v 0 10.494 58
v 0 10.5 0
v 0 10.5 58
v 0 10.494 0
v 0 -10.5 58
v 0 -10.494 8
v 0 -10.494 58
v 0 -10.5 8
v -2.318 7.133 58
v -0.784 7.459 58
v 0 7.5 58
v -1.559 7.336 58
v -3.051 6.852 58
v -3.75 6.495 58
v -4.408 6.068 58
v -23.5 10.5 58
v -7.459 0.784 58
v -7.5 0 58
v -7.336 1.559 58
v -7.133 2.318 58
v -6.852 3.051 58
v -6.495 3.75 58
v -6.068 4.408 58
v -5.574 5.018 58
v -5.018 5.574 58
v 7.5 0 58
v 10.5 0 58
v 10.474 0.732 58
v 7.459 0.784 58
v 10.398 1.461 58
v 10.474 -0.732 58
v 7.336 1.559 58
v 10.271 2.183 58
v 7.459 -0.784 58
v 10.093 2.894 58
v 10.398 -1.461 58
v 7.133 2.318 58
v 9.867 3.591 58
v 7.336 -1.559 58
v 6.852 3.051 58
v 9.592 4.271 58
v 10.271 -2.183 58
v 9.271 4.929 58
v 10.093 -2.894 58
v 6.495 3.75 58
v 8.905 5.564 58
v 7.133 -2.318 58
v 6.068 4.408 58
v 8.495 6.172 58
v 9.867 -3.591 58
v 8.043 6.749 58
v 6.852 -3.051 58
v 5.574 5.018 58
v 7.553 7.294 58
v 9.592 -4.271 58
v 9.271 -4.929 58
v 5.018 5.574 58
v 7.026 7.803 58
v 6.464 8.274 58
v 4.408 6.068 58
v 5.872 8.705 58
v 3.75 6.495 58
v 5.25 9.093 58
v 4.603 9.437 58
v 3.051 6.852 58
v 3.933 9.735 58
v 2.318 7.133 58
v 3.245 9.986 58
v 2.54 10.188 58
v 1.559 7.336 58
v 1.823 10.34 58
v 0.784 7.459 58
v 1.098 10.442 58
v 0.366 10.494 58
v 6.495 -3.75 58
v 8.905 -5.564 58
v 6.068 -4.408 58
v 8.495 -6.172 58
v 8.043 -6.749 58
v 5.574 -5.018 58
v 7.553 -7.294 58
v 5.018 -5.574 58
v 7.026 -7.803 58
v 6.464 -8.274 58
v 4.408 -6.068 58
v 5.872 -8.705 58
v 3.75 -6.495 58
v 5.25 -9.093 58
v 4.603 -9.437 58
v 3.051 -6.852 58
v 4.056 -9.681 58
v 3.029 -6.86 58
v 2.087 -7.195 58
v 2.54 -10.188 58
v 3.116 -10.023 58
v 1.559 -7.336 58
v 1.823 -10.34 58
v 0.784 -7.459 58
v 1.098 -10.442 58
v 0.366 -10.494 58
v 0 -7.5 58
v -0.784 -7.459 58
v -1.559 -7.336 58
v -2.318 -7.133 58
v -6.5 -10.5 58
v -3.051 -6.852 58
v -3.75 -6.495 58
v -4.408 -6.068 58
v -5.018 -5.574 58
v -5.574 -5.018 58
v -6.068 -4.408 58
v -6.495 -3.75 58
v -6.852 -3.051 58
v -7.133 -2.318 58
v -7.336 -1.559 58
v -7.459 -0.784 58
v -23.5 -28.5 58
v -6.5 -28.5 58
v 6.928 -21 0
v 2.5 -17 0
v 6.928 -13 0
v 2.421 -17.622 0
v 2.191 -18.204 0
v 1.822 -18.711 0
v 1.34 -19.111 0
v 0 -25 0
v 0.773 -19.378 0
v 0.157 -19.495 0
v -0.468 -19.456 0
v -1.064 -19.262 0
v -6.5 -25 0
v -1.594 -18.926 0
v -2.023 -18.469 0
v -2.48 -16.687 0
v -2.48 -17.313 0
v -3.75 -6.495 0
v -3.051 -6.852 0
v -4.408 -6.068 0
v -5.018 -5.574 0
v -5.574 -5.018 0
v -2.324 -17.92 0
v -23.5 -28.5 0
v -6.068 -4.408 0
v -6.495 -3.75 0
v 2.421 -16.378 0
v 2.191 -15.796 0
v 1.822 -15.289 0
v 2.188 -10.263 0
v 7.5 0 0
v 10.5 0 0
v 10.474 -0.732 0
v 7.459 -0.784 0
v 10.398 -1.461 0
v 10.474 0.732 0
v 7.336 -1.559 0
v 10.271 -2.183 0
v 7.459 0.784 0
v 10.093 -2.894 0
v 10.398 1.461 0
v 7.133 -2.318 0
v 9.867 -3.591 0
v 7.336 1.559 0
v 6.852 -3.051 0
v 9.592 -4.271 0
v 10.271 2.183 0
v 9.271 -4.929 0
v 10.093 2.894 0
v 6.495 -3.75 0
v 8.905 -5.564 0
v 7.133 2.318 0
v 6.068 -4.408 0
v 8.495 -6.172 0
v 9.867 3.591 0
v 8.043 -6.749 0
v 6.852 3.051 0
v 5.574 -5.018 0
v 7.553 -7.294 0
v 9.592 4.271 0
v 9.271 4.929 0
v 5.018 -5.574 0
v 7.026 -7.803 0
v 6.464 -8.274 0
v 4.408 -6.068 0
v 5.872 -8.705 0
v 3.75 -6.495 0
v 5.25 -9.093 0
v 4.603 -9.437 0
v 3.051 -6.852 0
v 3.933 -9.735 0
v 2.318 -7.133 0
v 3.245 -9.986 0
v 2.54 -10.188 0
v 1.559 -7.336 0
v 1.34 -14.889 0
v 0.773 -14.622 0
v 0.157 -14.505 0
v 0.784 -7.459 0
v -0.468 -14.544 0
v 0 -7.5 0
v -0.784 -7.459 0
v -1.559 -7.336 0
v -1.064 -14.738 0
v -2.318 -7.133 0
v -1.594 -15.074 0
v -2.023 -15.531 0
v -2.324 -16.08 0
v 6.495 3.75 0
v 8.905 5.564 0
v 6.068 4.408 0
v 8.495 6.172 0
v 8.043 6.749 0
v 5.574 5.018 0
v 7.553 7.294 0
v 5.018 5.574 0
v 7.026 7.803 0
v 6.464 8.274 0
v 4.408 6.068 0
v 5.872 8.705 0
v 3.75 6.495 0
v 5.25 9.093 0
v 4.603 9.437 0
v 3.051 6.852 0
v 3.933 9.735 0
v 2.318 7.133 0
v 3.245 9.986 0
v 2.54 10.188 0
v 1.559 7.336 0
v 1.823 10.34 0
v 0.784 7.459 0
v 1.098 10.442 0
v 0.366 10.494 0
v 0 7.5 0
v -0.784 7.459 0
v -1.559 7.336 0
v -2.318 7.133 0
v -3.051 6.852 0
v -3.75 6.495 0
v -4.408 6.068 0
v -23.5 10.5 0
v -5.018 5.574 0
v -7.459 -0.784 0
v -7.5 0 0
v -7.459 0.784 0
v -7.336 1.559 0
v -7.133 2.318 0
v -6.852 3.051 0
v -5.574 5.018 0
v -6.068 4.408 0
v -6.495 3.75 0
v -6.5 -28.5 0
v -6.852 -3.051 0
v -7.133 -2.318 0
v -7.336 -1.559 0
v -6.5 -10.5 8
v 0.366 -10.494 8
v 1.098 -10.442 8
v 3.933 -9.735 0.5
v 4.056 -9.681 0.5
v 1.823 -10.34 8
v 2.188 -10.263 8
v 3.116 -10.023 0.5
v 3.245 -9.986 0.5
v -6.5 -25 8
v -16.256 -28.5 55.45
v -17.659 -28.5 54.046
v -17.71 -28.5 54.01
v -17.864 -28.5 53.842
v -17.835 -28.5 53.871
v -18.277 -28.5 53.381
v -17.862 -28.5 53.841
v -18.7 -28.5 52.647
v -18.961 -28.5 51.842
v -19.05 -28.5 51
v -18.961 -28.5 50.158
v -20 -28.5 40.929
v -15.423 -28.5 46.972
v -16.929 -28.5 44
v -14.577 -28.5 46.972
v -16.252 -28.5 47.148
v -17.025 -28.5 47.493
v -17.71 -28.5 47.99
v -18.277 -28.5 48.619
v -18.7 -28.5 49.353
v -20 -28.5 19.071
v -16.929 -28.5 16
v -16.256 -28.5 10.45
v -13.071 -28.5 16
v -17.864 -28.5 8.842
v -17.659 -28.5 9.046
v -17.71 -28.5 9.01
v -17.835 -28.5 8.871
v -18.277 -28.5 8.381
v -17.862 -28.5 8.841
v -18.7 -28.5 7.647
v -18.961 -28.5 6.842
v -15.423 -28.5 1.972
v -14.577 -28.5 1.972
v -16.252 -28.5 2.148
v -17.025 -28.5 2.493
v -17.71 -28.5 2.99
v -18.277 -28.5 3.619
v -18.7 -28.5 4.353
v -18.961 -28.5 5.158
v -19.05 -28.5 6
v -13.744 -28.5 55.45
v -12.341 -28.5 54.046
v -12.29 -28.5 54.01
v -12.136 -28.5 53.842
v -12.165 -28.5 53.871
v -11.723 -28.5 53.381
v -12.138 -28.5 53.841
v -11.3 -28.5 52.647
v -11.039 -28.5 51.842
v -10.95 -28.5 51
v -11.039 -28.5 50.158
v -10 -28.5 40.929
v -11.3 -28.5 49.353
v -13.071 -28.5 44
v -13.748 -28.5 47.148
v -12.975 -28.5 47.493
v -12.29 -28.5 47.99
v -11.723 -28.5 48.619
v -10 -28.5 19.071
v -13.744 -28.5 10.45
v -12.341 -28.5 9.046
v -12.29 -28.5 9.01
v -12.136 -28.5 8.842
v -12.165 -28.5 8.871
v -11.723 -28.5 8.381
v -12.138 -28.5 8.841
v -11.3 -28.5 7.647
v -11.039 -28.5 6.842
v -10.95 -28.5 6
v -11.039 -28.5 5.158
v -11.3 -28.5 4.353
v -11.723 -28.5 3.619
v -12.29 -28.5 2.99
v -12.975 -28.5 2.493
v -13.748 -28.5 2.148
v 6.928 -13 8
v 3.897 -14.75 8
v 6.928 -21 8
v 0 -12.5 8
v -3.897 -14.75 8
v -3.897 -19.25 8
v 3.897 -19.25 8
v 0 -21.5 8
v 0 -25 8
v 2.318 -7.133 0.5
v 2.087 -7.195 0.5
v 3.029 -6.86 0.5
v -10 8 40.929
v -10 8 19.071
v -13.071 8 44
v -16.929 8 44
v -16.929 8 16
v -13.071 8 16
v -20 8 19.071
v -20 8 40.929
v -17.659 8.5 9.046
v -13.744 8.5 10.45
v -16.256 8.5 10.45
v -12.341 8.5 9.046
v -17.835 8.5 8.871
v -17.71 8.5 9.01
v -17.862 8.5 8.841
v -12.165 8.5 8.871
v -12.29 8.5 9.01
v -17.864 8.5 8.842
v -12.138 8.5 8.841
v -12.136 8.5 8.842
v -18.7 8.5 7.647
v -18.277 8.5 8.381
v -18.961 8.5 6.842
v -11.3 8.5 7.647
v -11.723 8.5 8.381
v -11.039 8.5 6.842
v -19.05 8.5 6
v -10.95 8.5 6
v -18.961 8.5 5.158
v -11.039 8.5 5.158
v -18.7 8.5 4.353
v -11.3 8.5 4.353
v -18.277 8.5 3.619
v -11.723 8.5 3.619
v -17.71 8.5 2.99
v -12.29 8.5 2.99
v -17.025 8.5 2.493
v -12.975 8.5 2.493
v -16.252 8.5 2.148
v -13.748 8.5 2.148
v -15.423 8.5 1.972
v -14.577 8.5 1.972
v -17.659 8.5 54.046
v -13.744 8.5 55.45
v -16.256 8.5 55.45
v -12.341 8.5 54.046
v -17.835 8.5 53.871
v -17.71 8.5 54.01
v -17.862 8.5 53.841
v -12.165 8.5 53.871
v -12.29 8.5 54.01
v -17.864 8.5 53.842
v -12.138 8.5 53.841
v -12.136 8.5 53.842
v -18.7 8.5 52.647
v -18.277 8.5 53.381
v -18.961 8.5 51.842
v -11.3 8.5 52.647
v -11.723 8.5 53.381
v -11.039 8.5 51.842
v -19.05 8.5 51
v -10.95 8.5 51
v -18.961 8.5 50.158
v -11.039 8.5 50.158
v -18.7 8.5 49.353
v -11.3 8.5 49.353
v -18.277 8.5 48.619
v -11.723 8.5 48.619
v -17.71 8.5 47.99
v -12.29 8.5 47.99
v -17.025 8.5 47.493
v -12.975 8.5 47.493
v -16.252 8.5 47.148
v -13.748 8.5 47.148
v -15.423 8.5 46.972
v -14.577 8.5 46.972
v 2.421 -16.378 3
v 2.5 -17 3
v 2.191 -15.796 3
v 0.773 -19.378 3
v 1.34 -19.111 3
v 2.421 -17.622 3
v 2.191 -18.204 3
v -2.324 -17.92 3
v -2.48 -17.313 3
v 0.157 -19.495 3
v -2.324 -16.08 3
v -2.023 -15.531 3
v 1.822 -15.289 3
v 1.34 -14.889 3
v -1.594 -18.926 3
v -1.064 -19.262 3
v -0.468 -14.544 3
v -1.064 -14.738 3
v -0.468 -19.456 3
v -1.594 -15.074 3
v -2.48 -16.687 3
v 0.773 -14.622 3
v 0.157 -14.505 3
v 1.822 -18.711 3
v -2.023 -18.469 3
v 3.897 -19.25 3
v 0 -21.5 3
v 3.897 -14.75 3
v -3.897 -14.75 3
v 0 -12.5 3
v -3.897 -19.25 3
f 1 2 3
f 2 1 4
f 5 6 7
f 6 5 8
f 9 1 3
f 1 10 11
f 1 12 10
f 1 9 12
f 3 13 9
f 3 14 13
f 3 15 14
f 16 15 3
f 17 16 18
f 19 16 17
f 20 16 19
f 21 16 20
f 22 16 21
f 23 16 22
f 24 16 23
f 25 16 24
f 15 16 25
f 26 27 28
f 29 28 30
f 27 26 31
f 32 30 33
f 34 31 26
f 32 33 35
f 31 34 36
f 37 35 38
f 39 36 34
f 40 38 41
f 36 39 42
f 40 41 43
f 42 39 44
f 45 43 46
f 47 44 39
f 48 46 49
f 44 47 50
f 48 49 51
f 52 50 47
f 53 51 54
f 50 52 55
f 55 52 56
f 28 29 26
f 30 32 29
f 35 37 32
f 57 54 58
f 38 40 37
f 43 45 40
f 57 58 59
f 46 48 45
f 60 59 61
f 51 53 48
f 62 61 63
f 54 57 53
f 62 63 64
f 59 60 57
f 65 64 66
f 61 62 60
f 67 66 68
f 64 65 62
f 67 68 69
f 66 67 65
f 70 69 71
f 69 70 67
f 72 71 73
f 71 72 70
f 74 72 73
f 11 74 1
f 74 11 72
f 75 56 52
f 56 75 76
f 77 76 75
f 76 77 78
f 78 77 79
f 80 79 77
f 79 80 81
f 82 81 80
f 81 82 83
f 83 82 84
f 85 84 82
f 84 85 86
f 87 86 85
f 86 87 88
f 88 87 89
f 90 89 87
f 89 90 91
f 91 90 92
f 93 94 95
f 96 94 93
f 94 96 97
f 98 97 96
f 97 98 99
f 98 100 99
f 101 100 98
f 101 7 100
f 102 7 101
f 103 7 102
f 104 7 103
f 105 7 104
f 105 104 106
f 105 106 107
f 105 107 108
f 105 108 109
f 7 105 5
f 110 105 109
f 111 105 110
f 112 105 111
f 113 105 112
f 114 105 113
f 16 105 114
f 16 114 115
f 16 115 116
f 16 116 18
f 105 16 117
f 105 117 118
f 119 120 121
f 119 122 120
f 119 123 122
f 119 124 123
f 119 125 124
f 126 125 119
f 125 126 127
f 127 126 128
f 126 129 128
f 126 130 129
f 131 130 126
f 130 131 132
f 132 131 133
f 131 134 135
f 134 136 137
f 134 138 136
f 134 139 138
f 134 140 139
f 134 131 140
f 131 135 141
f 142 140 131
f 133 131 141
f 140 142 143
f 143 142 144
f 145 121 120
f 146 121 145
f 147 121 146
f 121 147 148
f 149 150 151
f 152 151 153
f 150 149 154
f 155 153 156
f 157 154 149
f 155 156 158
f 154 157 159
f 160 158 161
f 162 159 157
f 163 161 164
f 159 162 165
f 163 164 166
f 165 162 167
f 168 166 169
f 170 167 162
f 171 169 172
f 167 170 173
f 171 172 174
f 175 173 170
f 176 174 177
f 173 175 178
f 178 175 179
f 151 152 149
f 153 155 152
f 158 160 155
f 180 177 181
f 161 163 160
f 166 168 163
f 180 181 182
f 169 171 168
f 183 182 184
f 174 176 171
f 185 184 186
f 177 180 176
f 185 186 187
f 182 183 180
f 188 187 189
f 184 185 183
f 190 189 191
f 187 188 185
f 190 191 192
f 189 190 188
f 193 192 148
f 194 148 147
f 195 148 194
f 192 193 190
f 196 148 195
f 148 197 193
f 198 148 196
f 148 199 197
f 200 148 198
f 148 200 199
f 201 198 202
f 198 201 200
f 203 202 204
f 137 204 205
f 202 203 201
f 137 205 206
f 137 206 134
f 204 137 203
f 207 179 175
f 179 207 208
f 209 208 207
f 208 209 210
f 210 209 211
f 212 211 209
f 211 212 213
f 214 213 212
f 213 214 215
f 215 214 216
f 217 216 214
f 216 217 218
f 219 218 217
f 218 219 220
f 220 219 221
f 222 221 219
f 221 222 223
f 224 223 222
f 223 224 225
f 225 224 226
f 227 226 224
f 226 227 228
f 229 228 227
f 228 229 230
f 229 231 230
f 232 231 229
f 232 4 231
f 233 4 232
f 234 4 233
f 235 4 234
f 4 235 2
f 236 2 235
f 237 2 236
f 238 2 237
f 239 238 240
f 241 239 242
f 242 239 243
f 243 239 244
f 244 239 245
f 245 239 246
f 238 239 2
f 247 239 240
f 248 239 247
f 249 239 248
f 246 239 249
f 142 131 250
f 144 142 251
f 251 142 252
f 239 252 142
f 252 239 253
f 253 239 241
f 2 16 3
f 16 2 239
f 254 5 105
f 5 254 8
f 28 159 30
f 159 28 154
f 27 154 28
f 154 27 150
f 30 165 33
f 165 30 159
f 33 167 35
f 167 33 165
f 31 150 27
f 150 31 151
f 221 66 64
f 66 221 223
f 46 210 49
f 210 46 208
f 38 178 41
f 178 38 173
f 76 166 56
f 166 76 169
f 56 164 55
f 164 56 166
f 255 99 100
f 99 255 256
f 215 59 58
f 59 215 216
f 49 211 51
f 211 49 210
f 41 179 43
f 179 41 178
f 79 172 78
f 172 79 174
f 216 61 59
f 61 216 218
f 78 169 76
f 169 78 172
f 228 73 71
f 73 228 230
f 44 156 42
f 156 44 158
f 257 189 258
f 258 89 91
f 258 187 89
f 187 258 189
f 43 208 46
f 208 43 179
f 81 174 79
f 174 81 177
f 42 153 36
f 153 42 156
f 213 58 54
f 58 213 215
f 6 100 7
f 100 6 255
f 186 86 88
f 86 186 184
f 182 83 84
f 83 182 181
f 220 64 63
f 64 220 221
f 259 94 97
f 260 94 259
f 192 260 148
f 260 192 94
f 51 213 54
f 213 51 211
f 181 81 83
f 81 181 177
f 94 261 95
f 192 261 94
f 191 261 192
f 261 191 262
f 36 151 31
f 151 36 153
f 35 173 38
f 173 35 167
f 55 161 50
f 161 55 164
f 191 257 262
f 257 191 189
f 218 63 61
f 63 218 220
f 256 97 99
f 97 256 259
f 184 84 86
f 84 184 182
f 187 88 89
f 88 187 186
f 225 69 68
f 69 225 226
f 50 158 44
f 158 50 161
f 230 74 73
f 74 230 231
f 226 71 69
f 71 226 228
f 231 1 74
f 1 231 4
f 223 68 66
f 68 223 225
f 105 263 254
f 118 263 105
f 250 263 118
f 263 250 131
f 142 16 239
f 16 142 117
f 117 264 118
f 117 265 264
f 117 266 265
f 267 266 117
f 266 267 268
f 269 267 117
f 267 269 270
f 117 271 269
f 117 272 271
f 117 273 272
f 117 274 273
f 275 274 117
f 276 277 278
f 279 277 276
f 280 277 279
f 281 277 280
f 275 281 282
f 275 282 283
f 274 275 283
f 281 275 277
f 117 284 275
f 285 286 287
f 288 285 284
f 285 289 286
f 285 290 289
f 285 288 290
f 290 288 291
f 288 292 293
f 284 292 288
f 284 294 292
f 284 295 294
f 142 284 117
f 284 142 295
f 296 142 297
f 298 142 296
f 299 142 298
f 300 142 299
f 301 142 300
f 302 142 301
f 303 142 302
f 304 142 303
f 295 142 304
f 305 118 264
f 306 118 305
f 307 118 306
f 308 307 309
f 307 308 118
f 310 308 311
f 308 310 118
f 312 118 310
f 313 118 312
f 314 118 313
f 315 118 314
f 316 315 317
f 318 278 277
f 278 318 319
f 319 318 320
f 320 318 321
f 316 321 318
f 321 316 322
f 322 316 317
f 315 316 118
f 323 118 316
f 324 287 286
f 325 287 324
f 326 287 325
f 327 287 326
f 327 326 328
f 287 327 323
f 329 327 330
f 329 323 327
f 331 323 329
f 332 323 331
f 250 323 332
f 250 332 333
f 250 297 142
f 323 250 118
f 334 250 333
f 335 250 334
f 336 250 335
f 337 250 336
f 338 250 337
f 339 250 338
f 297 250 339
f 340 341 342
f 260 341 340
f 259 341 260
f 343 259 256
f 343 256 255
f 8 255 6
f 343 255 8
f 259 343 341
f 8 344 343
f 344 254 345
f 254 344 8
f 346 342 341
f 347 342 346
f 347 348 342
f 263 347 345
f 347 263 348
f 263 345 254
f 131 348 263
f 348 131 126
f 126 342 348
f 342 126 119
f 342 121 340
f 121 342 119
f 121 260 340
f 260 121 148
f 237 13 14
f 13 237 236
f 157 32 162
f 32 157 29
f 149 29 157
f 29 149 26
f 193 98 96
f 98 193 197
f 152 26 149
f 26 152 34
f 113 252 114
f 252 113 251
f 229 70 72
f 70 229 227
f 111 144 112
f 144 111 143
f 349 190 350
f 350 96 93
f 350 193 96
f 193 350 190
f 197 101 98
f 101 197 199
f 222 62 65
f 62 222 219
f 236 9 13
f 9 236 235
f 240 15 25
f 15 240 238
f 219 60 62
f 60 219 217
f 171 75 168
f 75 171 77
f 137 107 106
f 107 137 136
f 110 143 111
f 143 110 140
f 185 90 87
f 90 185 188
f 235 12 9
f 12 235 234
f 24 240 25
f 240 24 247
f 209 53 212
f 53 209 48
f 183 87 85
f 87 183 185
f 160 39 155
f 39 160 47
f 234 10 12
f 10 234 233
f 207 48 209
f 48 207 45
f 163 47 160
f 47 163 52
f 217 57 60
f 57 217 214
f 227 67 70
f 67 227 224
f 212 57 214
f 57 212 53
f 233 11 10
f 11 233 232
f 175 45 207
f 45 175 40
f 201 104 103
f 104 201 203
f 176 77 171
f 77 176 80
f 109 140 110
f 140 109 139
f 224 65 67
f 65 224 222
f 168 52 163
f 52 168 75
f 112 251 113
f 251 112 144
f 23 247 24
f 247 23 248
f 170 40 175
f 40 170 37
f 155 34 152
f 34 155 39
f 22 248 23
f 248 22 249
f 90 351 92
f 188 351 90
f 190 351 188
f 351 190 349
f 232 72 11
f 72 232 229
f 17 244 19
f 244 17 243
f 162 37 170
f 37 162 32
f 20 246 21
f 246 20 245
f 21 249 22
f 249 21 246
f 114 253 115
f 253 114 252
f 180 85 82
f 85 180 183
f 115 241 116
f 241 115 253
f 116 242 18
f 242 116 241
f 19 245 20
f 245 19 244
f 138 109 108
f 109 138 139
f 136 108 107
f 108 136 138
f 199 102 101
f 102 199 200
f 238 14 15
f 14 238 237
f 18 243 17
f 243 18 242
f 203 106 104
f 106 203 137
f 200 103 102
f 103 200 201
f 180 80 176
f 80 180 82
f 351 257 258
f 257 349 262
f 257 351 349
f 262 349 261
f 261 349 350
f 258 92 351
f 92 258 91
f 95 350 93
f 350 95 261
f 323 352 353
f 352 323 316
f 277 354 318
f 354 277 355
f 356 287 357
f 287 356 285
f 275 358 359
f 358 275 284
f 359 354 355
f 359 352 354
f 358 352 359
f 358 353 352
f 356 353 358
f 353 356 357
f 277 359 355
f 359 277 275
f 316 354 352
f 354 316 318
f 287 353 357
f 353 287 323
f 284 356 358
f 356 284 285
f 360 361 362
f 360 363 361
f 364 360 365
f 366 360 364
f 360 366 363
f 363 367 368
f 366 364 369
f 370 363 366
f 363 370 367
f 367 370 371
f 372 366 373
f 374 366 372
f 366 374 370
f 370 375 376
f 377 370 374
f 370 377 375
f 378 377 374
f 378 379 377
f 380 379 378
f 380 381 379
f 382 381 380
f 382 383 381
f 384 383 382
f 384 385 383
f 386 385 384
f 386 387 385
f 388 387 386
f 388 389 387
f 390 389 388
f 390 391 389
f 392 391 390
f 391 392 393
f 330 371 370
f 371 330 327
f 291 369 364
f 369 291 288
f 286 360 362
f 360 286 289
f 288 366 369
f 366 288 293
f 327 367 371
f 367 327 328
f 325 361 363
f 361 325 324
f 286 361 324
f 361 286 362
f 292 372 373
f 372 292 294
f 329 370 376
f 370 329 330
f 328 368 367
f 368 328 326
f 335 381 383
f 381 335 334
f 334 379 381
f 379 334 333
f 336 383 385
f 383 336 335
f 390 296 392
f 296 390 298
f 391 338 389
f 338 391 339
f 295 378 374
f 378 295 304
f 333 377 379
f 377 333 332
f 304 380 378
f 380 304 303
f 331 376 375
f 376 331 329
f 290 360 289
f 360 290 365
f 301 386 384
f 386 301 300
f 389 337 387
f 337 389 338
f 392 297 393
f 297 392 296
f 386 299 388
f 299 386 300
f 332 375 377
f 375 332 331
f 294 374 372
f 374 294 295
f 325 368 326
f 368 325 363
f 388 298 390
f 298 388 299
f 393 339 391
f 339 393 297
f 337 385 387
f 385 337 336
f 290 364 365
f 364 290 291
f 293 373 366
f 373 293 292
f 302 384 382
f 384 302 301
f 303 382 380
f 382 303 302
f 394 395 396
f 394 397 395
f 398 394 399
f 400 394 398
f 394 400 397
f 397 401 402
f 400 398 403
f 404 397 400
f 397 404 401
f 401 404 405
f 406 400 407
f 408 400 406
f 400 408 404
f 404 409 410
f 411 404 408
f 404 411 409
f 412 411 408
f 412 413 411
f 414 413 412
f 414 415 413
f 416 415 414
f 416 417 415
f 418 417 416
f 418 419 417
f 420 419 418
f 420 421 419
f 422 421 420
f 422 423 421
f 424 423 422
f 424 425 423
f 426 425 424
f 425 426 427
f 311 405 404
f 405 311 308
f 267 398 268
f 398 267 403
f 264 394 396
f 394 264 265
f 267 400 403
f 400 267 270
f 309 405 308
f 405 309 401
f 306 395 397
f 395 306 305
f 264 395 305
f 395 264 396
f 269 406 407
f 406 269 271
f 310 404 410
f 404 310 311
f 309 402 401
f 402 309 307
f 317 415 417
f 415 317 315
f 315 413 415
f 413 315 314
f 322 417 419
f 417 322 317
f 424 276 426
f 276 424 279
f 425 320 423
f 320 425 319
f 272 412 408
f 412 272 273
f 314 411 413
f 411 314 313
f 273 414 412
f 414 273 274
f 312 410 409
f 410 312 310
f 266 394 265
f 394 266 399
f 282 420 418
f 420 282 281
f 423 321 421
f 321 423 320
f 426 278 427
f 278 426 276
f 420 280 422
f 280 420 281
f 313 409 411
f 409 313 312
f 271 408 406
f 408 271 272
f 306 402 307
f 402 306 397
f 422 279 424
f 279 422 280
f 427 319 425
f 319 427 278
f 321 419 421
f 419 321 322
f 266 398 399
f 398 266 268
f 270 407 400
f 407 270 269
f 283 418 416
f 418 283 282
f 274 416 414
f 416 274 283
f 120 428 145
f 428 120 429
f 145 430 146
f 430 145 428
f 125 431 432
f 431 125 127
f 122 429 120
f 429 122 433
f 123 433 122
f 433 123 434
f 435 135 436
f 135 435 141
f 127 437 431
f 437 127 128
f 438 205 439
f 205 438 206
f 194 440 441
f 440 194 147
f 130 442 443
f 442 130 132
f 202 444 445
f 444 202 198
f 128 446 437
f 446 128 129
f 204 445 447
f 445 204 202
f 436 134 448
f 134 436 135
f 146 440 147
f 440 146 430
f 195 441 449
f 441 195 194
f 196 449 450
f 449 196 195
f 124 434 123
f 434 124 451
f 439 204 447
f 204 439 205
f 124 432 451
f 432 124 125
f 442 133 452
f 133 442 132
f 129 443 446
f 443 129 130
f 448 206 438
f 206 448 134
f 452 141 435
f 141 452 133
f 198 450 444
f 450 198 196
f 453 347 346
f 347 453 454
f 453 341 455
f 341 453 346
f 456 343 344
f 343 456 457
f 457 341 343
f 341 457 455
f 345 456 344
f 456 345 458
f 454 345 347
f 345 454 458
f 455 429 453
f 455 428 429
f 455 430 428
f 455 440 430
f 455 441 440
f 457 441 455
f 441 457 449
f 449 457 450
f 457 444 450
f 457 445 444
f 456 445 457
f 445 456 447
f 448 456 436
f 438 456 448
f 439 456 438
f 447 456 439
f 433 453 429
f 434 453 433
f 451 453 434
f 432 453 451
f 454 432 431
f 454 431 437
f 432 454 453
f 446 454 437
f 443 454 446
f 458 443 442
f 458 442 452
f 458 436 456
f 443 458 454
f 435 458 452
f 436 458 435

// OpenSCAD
// file: bearing.scad
// PRUSA iteration3
// Bearing holders
// GNU GPL v3
// Josef Průša <iam@josefprusa.cz> and contributors
// http://www.reprap.org/wiki/Prusa_Mendel
// http://prusamendel.org

bearing_diameter = 15;
thinwall         = 3;
bearing_size     = bearing_diameter + 2 * thinwall;


module horizontal_bearing_base(bearings=1){
    translate(v=[0,0,6]) cube(size = [24,8+bearings*25,12], center = true);	
}

module horizontal_bearing_holes(bearings=1){
    cutter_lenght     = 10+bearings*25;
    one_holder_lenght = 8+25;
    holder_lenght     = 8+bearings*25;
 
    //Main bearing cut
    difference(){
        translate(v=[0,0,12]) rotate(a=[90,0,0]) translate(v=[0,0,-cutter_lenght/2]) cylinder(h = cutter_lenght, r=bearing_diameter/2, $fn=50);
        
        //Bearing retainers
        translate(v=[0,1-holder_lenght/2,3]) cube(size = [24,6,8], center = true);
        translate(v=[0,-1+holder_lenght/2,3]) cube(size = [24,6,8], center = true);
    }
 
    //Ziptie cutouts
    ziptie_cut_ofset = 0;

    for (i = [0 : bearings-1]){
        // For easier positioning I move them by half of one 
        // bearing holder then add each bearign lenght and then center again
        translate(v=[0,-holder_lenght/2,0]) translate(v=[0,one_holder_lenght/2+i*25,0]) difference(){
            union(){
                translate(v=[0,2-6,12]) rotate(a=[90,0,0]) translate(v=[0,0,0]) cylinder(h = 4, r=12.5, $fn=50);
                translate(v=[0,2+6,12]) rotate(a=[90,0,0]) translate(v=[0,0,0]) cylinder(h = 4, r=12.5, $fn=50);
            }
            translate(v=[0,10,12]) rotate(a=[90,0,0]) translate(v=[0,0,0]) cylinder(h = 24, r=10, $fn=50);
        }
    }
}

module horizontal_bearing_test(){
    difference(){
        horizontal_bearing_base(1);
        horizontal_bearing_holes(1);
    }
    translate(v=[30,0,0]) difference(){
        horizontal_bearing_base(2);
        horizontal_bearing_holes(2);
    }

    translate(v=[60,0,0]) difference(){
        horizontal_bearing_base(3);
        horizontal_bearing_holes(3);
    }
}

module vertical_bearing_base(){
    translate(v=[-2-bearing_size/4,0,29]) cube(size = [4+bearing_size/2,bearing_size,58], center = true);
    cylinder(h = 58, r=bearing_size/2, $fn = 90);
}

module vertical_bearing_holes(){
    translate(v=[0,0,-1]) cylinder(h = 62, r=bearing_diameter/2, $fn = 60);
    rotate(a=[0,0,-70]) translate(v=[8,0,31.5]) cube(size = [5,1,62], center = true);
}

//Final part
difference(){
    vertical_bearing_base();
    vertical_bearing_holes();
}
// main file
// PRUSA iteration3
// X end prototype
// GNU GPL v3
// Josef Průša <iam@josefprusa.cz> and contributors
// http://www.reprap.org/wiki/Prusa_Mendel
// http://prusamendel.org

use <bearing.scad>

rod_distance = 45;


module x_end_base(){
	//Main block
	height = 58;
	translate(v=[-15,-9,height/2]) cube(size = [17,39,height], center = true);
	
	//Bearing holder
 	vertical_bearing_base();	
	
	//Nut trap
 	// Cube
 	translate(v=[-2-2,-17,4]) cube(size = [8,16,8], center = true);

 	//Hexagon
 	translate(v=[0,-17,0]) rotate([0,0,30]) cylinder(h = 8, r=8, $fn = 6);
}

module x_end_holes(){
    vertical_bearing_holes();
    
    //Belt hole
    translate(v=[-1,0,0]) difference(){
	   translate(v=[-5.5-10+1.5,-15,30]) cube(size = [10,46,28], center = true);
    	// Nice edges
    	translate(v=[-5.5-10+1.5,-10,30+23]) rotate([0,45,0]) cube(size = [10,46,28], center = true);
    	translate(v=[-5.5-10+1.5,-10,30+23]) rotate([0,-45,0]) cube(size = [10,46,28], center = true);
    	translate(v=[-5.5-10+1.5,-10,30-23]) rotate([0,45,0]) cube(size = [10,46,28], center = true);
    	translate(v=[-5.5-10+1.5,-10,30-23]) rotate([0,-45,0]) cube(size = [10,46,28], center = true);

    }

    //Bottom pushfit rod
    translate(v=[-15,-41.5,6]) rotate(a=[-90,0,0]) pushfit_rod(8.1,50);

    //Top pushfit rod
    translate(v=[-15,-41.5,rod_distance+6]) rotate(a=[-90,0,0]) pushfit_rod(8.1,50);
    
    //Nut trap
    translate(v=[0,-17,-0.5]) cylinder(h = 4, r1=2.5, r2=2.5, $fn=25);
    translate(v=[0,-17,3]) rotate([0,0,30]) cylinder(h = 10, r=4.5, $fn = 6);
}

module pushfit_rod(diameter,length){
    cylinder(h = length, r=diameter/2, $fn=30);
    difference(){
        translate(v=[0,-diameter/2.85,length/2]) rotate([0,0,45]) cube(size = [diameter/2,diameter/2,length], center = true);
        translate(v=[0,-diameter/4-diameter/2-0.4,length/2]) rotate([0,0,0]) cube(size = [diameter,diameter/2,length], center = true);
    }
}

//Final part
module x_end_plain(){
    difference(){
        x_end_base();
        x_end_holes();
    }
}

x_end_plain();
